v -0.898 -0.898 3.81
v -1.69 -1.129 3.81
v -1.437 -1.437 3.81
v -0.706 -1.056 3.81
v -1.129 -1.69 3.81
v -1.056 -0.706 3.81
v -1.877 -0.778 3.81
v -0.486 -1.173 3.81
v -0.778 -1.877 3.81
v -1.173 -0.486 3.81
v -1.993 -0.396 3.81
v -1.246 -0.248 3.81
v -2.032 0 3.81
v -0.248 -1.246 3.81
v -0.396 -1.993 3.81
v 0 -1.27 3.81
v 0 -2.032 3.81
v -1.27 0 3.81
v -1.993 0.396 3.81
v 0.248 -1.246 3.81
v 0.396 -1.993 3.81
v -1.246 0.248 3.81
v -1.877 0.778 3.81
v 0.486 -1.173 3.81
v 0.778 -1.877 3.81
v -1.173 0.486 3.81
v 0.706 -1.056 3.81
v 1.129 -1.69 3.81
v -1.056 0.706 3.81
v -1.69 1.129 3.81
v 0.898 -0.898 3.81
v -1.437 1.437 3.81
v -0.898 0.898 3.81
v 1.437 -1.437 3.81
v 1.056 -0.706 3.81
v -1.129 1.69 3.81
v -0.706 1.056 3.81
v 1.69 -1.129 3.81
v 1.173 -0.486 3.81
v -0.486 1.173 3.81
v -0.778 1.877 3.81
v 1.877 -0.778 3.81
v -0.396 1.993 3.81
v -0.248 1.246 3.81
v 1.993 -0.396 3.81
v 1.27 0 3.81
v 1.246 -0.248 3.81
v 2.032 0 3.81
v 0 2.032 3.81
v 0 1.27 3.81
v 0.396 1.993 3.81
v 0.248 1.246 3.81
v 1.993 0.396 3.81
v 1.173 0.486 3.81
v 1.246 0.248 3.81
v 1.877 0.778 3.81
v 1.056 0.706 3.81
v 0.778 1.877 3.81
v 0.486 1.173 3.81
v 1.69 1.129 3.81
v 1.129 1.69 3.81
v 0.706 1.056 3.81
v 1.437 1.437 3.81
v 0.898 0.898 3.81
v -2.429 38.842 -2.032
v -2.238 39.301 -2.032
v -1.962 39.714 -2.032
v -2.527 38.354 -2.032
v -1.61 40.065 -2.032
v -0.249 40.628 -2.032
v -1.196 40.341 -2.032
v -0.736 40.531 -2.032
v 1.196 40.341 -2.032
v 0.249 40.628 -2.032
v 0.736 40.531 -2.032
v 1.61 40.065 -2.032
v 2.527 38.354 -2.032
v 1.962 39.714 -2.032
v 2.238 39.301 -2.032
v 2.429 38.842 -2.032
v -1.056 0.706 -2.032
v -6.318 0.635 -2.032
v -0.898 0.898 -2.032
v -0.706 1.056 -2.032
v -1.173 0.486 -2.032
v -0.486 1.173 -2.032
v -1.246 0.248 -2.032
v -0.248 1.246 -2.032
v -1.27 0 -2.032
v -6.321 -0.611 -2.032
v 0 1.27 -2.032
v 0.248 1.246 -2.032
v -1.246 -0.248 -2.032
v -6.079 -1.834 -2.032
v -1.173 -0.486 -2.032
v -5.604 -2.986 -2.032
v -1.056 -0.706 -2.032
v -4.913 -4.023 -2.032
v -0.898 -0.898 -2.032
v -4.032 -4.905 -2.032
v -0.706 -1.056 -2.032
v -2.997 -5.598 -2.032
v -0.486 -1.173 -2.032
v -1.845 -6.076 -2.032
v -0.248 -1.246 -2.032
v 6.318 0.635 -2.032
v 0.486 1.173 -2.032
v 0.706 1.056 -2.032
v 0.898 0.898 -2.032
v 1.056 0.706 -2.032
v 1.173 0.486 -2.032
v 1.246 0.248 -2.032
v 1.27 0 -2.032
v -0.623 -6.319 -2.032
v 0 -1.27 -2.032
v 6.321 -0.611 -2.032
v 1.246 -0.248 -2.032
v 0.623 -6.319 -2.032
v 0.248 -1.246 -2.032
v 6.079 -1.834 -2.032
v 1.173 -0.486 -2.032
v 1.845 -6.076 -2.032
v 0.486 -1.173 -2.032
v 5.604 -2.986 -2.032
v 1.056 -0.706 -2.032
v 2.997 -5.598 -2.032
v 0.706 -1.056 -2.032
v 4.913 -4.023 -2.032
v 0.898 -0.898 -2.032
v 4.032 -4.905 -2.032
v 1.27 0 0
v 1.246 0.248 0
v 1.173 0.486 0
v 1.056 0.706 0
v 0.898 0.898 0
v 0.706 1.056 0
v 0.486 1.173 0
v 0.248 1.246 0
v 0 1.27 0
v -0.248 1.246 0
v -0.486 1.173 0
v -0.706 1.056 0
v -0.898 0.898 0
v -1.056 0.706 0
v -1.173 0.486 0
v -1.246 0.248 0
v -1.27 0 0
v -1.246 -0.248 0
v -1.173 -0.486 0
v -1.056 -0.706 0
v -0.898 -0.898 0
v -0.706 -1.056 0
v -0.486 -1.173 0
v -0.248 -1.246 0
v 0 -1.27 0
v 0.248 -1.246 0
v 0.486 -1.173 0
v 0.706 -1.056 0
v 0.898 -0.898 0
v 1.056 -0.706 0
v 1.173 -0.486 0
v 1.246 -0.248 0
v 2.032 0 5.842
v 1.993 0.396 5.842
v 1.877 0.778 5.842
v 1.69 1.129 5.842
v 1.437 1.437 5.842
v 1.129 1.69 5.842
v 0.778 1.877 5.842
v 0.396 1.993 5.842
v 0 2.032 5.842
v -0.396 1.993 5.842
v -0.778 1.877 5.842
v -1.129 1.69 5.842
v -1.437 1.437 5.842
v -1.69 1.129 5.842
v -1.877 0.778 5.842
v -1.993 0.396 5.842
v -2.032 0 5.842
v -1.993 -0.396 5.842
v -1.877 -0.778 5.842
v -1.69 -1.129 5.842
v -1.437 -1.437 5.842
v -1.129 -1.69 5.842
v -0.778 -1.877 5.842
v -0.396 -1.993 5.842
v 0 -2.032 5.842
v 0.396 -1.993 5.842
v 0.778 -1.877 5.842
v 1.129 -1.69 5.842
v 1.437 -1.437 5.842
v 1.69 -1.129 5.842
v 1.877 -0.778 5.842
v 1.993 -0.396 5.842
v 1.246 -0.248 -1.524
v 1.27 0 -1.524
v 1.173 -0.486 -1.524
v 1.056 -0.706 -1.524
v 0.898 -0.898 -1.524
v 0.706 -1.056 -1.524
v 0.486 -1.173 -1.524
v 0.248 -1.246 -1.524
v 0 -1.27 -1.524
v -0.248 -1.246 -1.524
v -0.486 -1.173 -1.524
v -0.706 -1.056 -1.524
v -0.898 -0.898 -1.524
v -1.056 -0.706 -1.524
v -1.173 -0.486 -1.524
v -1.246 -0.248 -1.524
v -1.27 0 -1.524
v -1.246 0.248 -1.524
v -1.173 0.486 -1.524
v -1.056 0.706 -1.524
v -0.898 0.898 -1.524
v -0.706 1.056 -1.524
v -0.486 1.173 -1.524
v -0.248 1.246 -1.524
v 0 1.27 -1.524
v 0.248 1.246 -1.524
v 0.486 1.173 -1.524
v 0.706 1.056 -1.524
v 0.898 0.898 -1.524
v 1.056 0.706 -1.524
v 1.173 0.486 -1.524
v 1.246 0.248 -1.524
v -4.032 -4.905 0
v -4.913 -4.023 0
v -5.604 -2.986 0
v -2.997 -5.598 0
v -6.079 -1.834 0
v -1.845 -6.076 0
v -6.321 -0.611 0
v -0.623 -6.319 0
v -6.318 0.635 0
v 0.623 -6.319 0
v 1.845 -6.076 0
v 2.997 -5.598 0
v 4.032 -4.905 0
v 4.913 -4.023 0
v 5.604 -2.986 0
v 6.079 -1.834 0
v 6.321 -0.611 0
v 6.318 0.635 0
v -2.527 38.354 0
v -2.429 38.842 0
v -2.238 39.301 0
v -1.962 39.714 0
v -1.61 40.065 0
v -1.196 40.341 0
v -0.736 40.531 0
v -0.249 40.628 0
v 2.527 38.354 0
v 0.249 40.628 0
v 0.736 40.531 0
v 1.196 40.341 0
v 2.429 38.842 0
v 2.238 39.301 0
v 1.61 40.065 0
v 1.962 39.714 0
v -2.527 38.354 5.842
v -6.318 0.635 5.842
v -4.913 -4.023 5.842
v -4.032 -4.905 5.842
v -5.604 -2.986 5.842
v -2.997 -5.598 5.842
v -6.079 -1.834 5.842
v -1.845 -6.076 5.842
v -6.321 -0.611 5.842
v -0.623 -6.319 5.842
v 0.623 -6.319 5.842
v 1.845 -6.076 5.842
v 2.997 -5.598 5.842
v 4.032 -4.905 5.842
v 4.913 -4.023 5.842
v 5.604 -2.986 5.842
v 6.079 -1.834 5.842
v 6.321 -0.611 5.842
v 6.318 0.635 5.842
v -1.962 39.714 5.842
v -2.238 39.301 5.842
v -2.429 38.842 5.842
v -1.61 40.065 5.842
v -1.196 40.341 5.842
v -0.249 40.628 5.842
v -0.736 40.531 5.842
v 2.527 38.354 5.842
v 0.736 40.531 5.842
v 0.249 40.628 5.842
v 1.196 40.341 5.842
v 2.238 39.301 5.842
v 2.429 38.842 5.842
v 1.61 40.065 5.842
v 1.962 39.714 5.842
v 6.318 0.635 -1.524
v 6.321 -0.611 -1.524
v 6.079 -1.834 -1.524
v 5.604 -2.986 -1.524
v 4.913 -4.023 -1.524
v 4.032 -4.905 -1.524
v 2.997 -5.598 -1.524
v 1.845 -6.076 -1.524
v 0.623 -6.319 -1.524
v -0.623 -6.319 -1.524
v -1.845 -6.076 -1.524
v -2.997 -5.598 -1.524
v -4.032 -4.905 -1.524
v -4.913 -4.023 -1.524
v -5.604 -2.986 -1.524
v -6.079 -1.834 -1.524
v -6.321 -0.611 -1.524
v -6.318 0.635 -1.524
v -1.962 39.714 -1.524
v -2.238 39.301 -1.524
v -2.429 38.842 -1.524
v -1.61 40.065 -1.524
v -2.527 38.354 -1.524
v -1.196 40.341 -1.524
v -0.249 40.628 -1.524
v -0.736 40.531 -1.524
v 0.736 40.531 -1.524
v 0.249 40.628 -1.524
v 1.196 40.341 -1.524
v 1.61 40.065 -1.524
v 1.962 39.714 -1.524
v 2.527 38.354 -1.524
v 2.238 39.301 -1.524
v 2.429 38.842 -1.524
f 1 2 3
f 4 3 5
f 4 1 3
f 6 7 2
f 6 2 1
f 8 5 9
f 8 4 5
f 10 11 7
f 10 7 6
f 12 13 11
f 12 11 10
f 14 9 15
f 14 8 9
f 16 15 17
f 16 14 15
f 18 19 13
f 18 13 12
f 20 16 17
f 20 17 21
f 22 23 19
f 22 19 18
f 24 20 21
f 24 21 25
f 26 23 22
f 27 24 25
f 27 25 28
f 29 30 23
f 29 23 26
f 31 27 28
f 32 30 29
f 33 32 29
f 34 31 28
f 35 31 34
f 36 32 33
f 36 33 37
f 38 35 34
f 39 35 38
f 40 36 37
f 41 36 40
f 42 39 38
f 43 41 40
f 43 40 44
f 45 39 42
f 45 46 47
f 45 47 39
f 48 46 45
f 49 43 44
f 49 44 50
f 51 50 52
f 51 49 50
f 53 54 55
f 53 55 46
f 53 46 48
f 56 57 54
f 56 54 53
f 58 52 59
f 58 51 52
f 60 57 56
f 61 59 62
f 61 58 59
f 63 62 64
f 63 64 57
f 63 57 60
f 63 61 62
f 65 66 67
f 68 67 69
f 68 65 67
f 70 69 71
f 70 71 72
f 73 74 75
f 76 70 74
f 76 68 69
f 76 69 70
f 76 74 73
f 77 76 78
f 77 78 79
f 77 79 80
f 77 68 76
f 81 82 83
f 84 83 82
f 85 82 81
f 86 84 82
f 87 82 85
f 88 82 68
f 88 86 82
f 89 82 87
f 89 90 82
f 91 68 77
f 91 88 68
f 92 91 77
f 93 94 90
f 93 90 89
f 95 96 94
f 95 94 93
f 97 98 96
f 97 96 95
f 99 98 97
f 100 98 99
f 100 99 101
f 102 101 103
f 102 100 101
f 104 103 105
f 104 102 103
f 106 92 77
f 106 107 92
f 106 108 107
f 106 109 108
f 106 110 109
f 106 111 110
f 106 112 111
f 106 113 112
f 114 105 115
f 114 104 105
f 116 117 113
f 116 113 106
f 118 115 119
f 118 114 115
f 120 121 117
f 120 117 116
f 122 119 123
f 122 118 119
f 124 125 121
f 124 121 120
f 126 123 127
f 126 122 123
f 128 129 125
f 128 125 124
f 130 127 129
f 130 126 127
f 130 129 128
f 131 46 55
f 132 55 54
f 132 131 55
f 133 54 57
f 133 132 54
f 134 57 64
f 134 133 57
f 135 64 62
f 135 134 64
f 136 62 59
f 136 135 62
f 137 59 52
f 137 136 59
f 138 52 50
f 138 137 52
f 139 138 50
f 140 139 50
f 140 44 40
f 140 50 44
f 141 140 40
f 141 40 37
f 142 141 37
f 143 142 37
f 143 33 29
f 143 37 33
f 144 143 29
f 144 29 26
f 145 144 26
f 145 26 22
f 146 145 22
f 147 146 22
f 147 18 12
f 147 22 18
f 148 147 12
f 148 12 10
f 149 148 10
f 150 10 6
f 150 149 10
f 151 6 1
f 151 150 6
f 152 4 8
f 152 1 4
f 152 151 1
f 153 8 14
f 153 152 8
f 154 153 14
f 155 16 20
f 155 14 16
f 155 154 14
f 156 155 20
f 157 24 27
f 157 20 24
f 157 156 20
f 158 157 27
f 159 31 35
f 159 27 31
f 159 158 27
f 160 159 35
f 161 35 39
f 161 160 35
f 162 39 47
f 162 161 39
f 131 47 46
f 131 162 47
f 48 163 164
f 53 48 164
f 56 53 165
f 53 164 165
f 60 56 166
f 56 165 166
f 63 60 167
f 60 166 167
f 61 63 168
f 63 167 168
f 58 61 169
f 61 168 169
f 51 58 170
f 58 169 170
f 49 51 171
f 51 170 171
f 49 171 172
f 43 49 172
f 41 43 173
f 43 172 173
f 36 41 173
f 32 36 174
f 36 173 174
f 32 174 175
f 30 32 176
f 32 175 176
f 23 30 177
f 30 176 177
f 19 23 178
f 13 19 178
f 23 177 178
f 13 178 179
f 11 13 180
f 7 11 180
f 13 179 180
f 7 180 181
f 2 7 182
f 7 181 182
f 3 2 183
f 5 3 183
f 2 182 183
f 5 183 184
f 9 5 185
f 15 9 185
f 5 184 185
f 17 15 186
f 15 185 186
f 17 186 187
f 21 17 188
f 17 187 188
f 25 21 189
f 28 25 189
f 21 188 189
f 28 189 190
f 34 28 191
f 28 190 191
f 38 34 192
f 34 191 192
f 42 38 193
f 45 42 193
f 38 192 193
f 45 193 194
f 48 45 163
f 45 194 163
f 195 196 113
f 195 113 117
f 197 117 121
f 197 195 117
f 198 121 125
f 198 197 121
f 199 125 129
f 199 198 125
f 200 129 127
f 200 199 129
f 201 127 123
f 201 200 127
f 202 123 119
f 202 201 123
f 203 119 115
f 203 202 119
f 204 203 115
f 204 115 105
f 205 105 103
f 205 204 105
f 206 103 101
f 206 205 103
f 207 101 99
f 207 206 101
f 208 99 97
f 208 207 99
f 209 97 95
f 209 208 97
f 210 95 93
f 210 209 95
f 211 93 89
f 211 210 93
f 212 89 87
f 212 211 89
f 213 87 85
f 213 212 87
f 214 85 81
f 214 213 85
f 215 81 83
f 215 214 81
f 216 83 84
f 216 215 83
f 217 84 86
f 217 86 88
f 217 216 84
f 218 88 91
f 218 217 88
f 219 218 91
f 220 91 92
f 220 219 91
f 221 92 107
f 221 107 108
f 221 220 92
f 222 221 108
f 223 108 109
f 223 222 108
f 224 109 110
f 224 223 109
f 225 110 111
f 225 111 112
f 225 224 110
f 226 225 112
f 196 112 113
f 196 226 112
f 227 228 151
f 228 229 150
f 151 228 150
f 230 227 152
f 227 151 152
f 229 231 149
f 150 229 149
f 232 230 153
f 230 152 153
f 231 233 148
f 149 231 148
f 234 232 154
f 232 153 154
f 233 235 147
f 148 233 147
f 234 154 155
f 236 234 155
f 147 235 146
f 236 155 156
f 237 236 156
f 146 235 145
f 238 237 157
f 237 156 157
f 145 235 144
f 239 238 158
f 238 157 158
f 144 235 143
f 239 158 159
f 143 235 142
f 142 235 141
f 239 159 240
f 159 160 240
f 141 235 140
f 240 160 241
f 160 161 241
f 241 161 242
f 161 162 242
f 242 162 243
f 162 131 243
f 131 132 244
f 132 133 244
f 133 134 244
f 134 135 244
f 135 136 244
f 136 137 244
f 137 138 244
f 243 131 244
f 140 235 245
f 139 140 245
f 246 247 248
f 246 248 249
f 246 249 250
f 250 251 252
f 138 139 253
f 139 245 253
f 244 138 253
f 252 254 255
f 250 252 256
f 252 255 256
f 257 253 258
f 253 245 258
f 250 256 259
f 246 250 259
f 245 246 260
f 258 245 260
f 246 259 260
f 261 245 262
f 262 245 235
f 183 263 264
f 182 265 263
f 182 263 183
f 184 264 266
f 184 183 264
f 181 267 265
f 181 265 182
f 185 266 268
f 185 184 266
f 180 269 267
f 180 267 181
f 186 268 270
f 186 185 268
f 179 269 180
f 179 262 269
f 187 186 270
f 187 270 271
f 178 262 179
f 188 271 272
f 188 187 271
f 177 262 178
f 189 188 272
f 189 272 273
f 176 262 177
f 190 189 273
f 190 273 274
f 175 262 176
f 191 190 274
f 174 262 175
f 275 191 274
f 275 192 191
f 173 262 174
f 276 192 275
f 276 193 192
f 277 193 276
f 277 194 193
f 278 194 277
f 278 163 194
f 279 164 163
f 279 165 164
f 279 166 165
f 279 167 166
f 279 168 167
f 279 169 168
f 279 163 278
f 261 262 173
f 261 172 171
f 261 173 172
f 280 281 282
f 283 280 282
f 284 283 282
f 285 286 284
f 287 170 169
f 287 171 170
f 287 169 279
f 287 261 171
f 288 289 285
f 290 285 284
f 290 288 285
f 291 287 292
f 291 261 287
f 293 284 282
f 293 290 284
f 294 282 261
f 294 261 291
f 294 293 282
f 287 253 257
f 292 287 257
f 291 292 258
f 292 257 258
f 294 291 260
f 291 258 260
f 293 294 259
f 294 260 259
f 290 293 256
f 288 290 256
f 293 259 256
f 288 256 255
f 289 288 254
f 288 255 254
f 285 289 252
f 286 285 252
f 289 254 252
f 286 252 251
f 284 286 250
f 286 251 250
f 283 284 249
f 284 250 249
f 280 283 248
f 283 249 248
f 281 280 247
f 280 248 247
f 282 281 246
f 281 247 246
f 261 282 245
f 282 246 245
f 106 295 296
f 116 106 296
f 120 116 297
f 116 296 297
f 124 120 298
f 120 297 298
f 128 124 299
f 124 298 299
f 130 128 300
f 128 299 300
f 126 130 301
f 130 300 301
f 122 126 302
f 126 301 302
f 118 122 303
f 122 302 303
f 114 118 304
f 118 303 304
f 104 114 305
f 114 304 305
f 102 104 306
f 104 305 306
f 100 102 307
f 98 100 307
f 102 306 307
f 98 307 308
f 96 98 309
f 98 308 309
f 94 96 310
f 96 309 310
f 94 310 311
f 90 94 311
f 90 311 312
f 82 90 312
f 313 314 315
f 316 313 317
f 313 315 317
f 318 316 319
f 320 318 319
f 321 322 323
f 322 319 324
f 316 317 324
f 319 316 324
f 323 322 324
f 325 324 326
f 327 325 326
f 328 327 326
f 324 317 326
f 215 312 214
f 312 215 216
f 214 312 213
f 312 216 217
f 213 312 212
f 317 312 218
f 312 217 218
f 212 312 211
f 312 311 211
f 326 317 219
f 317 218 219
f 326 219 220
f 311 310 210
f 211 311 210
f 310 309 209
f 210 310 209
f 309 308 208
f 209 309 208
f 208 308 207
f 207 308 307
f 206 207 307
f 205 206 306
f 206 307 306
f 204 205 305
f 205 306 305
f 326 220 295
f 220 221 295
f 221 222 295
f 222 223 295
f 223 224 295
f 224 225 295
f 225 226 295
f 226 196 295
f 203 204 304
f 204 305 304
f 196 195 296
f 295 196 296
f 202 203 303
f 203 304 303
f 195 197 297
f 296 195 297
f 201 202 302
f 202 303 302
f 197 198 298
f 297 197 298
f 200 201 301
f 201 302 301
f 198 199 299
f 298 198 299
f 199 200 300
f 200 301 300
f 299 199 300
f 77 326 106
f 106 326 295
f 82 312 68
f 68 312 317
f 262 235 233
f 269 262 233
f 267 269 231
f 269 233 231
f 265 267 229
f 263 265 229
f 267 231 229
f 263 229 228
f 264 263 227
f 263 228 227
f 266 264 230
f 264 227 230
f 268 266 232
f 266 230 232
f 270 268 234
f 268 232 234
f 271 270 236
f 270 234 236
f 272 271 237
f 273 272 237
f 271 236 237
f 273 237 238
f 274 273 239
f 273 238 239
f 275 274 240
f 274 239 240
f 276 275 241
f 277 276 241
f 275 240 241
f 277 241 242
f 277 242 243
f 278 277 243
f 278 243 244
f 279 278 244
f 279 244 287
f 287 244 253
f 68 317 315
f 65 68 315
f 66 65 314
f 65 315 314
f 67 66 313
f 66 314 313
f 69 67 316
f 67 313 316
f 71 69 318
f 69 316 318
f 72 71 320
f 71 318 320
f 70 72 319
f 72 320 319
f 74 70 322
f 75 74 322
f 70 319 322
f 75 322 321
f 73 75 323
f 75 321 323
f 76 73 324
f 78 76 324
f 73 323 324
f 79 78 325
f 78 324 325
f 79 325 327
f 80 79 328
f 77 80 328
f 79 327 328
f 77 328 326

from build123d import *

# Parameters (mm, degrees)
F0_R     = 1.27
F1_DEPTH = 5.842
F2_R     = 2.032
F3_DEPTH = 2.032
F5_R     = 1.27
F6_DEPTH = 0.508


with BuildPart() as f1:
    # F0 (on Top) → F1 (new body)
    with BuildSketch(Plane.XY):
        with BuildLine():
            Line((-2.5272680903, 38.354), (-6.3181702256, 0.635))
            ThreePointArc((-6.3181702256, 0.635), (0, -6.35), (6.3181702256, 0.635))
            Line((6.3181702256, 0.635), (2.5272680903, 38.354))
            ThreePointArc((2.5272680903, 38.354), (0, 40.64), (-2.5272680903, 38.354))
        make_face()
        Circle(F0_R, mode=Mode.SUBTRACT)
    extrude(amount=F1_DEPTH)

    # F2 (on face) → F3 (cut)
    with BuildSketch(Plane.XY.offset(5.842)):
        Circle(F2_R)
    extrude(amount=-F3_DEPTH, mode=Mode.SUBTRACT)


with BuildPart() as f6:
    # F5 (on offset) → F6 (new body)
    with BuildSketch(Plane(origin=(0, 0, -1.524), x_dir=(1, 0, 0), z_dir=(0, 0, -1))):
        with BuildLine():
            ThreePointArc((6.3181702256, -0.635), (0, 6.35), (-6.3181702256, -0.635))
            Line((-6.3181702256, -0.635), (-2.5272680903, -38.354))
            ThreePointArc((-2.5272680903, -38.354), (0, -40.64), (2.5272680903, -38.354))
            Line((2.5272680903, -38.354), (6.3181702256, -0.635))
        make_face()
        Circle(F5_R, mode=Mode.SUBTRACT)
    extrude(amount=F6_DEPTH)


solid = Compound([f1.part, f6.part])
